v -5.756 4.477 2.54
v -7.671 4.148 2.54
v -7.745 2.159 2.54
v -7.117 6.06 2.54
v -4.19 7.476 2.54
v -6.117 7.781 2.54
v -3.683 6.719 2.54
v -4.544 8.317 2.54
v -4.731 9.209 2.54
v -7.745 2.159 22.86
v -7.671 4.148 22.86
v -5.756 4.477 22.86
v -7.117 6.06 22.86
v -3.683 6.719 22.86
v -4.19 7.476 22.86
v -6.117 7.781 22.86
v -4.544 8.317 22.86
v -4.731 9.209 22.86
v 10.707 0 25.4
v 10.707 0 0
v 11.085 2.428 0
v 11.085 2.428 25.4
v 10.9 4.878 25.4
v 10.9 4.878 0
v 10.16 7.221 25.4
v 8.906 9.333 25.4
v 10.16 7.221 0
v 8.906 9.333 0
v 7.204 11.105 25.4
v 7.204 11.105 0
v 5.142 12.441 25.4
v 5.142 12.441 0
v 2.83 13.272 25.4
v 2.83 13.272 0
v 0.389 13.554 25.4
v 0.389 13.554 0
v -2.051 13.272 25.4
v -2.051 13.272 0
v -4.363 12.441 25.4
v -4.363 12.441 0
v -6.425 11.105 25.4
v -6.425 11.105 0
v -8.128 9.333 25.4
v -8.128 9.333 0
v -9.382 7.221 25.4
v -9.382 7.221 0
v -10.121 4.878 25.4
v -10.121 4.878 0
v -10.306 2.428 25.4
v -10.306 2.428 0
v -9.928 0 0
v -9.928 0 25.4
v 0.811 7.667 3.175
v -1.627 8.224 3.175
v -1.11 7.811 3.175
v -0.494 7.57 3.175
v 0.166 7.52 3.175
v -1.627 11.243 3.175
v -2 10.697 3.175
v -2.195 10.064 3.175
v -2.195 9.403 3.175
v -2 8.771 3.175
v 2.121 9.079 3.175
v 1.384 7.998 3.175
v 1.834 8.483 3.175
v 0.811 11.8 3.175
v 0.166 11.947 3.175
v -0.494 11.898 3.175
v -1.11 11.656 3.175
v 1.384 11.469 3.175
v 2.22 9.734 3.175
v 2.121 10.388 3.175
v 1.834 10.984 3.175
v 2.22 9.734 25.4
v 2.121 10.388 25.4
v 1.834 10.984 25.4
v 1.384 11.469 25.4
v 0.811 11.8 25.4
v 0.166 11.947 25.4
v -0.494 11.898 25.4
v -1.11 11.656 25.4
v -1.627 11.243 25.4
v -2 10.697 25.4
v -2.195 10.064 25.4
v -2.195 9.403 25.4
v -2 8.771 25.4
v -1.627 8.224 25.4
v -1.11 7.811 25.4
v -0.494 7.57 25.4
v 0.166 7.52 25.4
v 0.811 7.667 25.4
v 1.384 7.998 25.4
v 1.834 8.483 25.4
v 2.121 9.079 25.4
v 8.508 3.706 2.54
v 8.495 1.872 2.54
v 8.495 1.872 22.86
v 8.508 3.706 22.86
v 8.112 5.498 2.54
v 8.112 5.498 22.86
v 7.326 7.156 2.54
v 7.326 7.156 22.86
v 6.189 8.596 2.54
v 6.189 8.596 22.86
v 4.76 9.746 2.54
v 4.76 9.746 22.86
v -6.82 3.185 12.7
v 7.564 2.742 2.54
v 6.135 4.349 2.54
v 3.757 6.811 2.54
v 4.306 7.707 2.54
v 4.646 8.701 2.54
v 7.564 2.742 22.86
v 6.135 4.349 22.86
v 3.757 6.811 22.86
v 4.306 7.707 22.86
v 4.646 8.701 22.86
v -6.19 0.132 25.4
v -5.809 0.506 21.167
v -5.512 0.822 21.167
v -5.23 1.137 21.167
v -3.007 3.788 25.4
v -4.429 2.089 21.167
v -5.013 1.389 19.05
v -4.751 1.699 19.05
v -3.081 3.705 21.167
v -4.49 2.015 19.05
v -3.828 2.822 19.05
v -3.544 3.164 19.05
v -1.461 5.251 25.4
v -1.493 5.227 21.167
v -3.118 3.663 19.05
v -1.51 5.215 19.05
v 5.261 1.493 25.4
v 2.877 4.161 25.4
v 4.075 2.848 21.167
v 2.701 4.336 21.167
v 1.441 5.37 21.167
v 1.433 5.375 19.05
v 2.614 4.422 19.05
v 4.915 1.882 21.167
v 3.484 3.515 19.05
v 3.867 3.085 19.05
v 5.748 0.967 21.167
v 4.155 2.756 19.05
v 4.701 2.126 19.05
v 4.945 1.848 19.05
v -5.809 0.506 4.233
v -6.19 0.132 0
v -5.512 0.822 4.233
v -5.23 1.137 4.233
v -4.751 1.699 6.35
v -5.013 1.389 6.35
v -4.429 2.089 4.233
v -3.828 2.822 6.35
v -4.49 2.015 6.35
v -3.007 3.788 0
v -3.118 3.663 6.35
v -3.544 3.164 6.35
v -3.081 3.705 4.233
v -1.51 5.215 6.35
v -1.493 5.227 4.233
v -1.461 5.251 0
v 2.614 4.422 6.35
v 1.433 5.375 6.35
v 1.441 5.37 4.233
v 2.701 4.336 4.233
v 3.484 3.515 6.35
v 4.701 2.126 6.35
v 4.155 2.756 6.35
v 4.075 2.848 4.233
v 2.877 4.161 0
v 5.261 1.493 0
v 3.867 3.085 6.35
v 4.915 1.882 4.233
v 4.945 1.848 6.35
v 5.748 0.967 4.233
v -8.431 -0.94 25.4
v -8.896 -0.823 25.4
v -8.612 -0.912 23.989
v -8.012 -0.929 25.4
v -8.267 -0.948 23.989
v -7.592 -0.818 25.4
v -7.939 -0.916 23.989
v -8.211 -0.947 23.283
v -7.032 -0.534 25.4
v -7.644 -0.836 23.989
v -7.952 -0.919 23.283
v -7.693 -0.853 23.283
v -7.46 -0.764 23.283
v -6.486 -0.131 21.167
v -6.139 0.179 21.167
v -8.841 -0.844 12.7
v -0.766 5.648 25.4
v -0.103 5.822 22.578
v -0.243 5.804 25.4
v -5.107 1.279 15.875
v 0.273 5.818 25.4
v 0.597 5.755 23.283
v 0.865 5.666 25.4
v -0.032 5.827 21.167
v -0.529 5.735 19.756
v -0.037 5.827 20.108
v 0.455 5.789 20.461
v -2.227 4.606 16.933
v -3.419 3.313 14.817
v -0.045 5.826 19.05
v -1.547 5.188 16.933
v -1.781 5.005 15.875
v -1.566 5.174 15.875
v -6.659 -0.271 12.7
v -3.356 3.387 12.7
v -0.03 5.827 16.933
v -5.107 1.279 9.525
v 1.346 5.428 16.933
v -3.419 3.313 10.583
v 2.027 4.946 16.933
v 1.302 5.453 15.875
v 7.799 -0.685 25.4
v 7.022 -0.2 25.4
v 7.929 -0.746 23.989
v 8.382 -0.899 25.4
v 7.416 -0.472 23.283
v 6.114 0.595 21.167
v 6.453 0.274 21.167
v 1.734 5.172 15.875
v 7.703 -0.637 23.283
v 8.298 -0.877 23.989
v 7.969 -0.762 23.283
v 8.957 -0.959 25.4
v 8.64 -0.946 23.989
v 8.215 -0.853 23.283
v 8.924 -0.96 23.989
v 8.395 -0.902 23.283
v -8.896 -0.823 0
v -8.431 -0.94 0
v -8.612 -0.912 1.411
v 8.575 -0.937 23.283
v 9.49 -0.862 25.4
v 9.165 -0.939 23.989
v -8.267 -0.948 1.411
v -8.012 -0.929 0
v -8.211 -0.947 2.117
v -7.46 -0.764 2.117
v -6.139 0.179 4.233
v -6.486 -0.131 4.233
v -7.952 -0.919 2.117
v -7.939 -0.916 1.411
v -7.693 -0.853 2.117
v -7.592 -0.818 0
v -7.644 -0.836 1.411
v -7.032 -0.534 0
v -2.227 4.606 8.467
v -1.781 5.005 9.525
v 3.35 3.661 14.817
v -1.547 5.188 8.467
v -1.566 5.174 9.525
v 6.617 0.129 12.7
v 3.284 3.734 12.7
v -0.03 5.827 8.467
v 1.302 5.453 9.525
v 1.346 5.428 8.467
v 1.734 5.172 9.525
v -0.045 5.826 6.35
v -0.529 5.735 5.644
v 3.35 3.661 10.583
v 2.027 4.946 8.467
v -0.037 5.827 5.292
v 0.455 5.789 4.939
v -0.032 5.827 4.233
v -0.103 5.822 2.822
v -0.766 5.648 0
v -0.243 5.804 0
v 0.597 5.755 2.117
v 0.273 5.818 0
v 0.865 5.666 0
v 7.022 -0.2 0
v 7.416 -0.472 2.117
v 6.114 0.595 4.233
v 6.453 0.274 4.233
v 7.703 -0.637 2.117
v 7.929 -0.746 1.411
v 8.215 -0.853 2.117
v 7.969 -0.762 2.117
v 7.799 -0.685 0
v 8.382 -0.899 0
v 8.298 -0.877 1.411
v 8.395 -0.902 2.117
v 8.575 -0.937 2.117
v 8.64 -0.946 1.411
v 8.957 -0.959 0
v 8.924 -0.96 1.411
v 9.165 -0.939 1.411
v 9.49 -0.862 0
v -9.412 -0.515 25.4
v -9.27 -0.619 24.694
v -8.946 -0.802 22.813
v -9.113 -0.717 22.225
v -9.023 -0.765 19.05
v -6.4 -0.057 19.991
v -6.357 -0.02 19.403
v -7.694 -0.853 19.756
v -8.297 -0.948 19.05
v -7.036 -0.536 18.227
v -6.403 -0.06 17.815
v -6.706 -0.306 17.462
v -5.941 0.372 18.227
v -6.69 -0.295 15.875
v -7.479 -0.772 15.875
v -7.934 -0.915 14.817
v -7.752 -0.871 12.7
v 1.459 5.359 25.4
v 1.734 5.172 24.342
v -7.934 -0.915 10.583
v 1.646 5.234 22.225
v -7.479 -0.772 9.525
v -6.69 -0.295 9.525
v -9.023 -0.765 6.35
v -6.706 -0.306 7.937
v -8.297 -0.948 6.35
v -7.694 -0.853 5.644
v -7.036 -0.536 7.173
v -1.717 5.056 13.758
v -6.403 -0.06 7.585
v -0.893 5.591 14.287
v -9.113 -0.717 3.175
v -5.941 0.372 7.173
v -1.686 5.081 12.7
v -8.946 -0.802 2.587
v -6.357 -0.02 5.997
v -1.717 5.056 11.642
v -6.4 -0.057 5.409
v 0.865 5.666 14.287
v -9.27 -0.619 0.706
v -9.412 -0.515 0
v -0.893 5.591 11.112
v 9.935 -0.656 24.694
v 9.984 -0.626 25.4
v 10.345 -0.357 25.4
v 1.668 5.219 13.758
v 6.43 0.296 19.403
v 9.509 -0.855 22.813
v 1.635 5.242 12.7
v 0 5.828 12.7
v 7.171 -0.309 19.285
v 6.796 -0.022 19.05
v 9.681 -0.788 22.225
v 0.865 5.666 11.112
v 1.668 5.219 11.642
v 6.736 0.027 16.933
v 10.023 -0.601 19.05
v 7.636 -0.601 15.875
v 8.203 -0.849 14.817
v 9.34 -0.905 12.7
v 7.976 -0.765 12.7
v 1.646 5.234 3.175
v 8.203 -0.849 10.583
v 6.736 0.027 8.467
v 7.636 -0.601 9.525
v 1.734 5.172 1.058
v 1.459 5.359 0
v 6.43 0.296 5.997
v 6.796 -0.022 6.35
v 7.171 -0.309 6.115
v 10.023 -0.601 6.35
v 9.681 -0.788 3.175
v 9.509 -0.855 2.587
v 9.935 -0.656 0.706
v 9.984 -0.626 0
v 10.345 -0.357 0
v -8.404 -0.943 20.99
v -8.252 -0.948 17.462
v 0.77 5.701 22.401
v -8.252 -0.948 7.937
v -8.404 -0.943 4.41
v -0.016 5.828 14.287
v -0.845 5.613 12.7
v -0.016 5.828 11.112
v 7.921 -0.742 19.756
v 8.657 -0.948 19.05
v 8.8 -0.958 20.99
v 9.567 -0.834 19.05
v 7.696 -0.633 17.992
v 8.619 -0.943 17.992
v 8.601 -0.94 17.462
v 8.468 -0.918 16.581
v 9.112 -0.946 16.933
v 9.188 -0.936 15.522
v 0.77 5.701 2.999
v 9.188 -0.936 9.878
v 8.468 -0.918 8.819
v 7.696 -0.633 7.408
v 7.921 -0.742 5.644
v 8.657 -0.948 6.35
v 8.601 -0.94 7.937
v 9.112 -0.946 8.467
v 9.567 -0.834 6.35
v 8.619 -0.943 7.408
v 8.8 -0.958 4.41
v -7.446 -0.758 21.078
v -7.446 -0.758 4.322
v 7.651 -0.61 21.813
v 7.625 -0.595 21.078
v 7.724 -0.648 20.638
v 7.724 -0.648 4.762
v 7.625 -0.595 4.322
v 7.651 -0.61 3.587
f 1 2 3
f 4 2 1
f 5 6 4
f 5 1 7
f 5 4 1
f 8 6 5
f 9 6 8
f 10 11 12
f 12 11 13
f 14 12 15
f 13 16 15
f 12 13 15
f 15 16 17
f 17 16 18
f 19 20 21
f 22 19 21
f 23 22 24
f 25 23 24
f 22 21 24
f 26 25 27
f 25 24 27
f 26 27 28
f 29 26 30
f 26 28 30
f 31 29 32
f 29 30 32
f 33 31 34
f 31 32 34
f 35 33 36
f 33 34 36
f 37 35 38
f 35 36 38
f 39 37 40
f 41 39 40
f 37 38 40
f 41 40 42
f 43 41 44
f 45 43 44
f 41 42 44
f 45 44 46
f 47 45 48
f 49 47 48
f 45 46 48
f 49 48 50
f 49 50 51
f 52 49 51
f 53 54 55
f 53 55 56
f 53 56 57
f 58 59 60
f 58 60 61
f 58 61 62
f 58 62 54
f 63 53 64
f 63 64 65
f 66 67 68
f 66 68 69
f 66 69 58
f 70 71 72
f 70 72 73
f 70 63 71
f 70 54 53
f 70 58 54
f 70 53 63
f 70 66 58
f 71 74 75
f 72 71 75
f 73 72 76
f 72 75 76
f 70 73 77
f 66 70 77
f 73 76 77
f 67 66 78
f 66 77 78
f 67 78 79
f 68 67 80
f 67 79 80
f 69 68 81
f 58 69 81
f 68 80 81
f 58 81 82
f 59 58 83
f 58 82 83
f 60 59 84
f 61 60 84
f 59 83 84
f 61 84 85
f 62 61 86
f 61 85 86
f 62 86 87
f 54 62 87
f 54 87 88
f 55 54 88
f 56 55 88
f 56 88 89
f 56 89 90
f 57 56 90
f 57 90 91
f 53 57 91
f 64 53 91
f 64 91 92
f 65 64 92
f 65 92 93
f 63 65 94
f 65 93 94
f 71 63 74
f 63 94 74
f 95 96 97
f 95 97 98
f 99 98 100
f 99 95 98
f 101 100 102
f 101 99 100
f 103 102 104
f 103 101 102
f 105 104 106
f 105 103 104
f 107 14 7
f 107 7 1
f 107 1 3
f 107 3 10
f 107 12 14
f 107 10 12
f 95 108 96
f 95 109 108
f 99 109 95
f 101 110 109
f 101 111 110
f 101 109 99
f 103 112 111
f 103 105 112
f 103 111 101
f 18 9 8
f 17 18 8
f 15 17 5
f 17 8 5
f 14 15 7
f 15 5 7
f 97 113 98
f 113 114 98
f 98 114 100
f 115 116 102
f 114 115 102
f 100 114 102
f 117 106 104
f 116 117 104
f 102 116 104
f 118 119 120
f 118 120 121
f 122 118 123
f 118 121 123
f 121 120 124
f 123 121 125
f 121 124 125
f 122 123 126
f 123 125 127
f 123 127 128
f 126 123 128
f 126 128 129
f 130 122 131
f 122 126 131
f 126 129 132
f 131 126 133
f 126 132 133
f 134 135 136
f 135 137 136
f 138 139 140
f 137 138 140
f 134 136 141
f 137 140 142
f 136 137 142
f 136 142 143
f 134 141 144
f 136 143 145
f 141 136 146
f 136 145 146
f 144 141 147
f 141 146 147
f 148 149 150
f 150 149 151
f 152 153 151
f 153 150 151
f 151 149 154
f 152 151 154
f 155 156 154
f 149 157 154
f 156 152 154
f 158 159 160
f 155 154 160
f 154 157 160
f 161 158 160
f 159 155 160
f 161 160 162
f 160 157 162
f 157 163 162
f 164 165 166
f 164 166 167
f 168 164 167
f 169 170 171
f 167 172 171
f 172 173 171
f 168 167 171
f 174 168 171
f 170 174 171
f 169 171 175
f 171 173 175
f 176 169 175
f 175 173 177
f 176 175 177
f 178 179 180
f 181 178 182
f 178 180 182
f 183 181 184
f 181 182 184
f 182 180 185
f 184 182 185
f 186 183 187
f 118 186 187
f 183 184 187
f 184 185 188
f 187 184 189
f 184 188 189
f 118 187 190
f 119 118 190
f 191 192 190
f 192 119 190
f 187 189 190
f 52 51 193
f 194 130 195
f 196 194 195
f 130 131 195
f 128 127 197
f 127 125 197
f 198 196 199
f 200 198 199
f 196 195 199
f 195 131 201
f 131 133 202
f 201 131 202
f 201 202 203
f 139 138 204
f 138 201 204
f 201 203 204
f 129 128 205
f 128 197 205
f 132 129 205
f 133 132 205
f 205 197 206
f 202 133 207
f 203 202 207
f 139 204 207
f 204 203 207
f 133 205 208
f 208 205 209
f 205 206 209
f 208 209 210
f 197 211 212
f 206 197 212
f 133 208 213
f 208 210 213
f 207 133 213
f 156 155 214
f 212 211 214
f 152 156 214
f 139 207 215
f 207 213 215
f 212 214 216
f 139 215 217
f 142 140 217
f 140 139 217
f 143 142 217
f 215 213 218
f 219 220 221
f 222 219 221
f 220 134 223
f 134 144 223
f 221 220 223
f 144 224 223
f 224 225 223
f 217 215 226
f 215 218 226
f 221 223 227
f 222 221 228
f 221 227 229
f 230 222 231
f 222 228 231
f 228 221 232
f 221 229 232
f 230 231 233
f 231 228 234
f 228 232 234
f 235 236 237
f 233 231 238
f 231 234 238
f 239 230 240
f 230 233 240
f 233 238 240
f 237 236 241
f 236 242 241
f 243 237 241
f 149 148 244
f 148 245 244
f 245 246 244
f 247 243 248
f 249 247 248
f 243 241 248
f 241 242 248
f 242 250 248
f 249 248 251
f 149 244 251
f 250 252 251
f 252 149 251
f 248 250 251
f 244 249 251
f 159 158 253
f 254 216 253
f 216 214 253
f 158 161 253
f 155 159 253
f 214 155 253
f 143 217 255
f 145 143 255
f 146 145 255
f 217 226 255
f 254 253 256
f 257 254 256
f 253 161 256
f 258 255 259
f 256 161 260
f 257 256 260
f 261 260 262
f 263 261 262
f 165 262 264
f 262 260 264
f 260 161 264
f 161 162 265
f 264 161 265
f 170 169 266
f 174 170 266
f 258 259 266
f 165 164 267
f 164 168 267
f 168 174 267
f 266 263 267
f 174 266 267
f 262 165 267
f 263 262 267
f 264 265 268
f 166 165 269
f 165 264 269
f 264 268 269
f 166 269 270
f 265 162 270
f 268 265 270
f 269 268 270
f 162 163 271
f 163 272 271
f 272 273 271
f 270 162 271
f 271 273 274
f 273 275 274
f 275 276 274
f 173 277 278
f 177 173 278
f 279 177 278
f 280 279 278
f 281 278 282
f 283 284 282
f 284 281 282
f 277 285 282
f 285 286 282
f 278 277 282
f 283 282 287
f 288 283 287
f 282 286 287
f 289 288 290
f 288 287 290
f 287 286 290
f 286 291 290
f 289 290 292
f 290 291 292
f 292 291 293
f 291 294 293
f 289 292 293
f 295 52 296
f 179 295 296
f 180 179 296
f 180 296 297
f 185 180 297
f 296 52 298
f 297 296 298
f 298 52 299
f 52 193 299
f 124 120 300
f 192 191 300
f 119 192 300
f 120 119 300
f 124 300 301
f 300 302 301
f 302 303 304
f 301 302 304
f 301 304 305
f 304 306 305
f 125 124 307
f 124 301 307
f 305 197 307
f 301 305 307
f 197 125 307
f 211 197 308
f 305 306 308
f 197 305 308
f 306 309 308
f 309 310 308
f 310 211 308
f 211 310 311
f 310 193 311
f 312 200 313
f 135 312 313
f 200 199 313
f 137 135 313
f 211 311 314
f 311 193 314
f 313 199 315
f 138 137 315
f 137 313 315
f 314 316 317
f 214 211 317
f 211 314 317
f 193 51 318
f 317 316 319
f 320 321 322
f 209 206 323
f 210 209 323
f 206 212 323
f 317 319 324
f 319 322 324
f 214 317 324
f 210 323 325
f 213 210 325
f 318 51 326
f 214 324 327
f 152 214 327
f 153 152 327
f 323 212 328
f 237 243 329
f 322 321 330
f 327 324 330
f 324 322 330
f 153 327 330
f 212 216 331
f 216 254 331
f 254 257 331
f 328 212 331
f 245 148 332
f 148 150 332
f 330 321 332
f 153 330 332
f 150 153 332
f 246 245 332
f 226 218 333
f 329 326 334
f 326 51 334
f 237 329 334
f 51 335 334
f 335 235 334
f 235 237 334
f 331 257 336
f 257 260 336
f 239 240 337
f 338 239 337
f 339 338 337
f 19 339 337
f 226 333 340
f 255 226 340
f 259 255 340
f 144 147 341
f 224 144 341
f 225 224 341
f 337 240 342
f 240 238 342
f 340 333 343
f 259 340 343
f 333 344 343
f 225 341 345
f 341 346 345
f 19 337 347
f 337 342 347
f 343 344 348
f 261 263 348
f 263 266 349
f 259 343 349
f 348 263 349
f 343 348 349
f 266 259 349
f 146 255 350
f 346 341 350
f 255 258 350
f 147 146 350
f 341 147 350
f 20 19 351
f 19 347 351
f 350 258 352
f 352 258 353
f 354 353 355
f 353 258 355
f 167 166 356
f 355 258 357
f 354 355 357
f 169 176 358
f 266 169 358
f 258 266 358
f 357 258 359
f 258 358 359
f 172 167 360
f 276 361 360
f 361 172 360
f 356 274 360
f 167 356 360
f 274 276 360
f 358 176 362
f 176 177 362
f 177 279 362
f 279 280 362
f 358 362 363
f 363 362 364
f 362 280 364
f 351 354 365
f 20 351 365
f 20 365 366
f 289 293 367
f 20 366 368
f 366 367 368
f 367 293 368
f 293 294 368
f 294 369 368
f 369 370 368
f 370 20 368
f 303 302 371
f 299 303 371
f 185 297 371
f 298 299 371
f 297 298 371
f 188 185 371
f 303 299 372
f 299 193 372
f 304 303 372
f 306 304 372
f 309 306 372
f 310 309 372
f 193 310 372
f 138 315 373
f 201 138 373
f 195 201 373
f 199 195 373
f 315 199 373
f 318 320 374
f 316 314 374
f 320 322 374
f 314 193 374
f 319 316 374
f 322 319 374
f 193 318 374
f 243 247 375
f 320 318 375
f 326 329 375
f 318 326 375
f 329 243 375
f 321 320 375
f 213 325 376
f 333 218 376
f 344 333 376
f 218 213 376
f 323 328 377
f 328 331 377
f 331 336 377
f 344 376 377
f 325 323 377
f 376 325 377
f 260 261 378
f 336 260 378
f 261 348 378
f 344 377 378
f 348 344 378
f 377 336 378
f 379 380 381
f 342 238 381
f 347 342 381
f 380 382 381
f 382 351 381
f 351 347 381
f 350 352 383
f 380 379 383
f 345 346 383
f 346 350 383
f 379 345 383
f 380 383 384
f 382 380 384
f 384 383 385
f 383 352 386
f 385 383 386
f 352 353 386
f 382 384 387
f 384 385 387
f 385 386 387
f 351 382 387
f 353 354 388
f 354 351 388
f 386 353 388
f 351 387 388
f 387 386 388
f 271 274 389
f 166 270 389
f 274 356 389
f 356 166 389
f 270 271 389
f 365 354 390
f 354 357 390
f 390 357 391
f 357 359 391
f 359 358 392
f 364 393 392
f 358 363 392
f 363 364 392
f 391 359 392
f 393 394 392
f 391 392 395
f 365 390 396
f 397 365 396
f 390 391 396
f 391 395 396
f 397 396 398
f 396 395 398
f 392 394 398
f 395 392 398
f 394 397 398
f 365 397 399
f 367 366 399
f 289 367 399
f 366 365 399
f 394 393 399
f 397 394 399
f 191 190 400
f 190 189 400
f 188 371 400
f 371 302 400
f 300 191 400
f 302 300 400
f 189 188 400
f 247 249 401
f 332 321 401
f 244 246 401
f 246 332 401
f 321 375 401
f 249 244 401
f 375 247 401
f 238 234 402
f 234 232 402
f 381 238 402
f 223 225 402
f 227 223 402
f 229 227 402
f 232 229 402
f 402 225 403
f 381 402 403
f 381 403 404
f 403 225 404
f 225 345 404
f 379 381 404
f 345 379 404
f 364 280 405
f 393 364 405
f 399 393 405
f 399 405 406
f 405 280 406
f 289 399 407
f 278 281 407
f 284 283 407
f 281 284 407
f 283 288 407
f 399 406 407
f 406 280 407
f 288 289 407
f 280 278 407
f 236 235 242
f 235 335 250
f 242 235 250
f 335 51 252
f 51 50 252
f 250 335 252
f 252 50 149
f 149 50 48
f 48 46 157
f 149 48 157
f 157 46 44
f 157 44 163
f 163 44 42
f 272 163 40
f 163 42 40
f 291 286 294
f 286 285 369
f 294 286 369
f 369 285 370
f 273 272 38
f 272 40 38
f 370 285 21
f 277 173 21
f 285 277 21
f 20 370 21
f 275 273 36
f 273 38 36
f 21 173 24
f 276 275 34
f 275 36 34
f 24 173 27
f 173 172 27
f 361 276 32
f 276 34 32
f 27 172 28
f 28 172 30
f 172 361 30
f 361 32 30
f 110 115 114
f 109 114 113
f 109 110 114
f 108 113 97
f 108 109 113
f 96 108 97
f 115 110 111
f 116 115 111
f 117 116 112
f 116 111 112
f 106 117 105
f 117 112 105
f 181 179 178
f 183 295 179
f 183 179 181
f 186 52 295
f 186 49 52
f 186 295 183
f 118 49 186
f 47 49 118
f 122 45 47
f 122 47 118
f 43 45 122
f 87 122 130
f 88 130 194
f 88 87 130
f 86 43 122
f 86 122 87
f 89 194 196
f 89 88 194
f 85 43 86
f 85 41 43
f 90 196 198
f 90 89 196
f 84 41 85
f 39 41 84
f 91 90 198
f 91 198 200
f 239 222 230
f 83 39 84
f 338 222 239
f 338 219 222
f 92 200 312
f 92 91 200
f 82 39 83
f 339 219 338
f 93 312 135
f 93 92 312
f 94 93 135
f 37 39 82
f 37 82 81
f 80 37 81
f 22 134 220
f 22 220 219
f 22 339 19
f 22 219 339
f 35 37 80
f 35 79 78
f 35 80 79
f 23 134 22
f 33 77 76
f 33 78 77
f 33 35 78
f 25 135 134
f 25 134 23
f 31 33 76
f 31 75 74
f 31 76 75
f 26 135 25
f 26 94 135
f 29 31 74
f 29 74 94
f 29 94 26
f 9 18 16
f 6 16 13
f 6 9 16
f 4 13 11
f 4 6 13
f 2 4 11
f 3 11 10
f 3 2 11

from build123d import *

# Parameters (mm, degrees)
F1_DEPTH = 25.4
F2_R     = 2.2195966307
F3_DEPTH = 22.225
F4_T     = 2.54


# Not quite as in the source:
# - a shell that OpenCascade refuses in one call is made with other operations: the cavity is built on its own and cut out


with BuildPart() as f1:
    # F0 (on Top) → F1 (new body)
    with BuildSketch(Plane.XY):
        with BuildLine():
            add(Edge.make_bspline(
                [(-9.9282488227, 0), (-6.6706539696, -3.9497121754), (-0.009677335, 15.6506770315), (7.0833598277, -4.0324827548), (10.7069341466, 0)],
                knots=[0, 0, 0, 0, 0.4928486408, 1, 1, 1, 1], degree=3))
            ThreePointArc((10.7069341466, 0), (0.3893426619, 13.5539694573), (-9.9282488227, 0))
        make_face()
    extrude(amount=F1_DEPTH)

    # F2 (on face) → F3 (cut)
    with BuildSketch(Plane.XY.offset(25.4)):
        with Locations((0, 9.7335772589)):
            Circle(F2_R)
    extrude(amount=-F3_DEPTH, mode=Mode.SUBTRACT)

    # F4: shell of thickness 2.54, made by hand


with BuildPart() as f4_core1:
    # F4_t2: copy of F1
    add(f1.part)

    # the walls: a layer under each face that stays
    f4_faces = [f4_core1.faces().sort_by_distance(p)[0] for p in [
        (0.1475396024, 5.8275524101, 12.7),
        (0.3893426619, 13.5539694573, 12.7),
        (0.3893426619, 5.8090971383, 0),
        (0.3893426619, 5.8090971383, 25.4),
        (-2.2195966307, 9.7335772589, 14.2875),
        (0, 9.7335772589, 3.175),
    ]]
    thicken(f4_faces, amount=-F4_T, mode=Mode.SUBTRACT)

    # F4_s3 → F4_t4 (revolve, cut)
    with BuildSketch(Plane.XZ.offset(-9.7335772589)):
        Polygon((2.1941966307, 3.2004), (4.7595966307, 3.175), (4.7595966307, 0.635), (2.2195966307, 0.635), align=None)
    revolve(axis=Axis((0, 9.7335772589, 3.175), (0, 0, 1)), mode=Mode.SUBTRACT)


with BuildPart() as f1_1:
    add(f1.part)

    # what is left inside the walls is the cavity
    f4_cavity = [f4_core1.part.solids().sort_by_distance(p)[0] for p in [
        (-7.093674, 6.050134, 16.086667),
        (7.742605, 6.337968, 16.086667),
    ]]
    add(f4_cavity, mode=Mode.SUBTRACT)


solid = f1_1.part
